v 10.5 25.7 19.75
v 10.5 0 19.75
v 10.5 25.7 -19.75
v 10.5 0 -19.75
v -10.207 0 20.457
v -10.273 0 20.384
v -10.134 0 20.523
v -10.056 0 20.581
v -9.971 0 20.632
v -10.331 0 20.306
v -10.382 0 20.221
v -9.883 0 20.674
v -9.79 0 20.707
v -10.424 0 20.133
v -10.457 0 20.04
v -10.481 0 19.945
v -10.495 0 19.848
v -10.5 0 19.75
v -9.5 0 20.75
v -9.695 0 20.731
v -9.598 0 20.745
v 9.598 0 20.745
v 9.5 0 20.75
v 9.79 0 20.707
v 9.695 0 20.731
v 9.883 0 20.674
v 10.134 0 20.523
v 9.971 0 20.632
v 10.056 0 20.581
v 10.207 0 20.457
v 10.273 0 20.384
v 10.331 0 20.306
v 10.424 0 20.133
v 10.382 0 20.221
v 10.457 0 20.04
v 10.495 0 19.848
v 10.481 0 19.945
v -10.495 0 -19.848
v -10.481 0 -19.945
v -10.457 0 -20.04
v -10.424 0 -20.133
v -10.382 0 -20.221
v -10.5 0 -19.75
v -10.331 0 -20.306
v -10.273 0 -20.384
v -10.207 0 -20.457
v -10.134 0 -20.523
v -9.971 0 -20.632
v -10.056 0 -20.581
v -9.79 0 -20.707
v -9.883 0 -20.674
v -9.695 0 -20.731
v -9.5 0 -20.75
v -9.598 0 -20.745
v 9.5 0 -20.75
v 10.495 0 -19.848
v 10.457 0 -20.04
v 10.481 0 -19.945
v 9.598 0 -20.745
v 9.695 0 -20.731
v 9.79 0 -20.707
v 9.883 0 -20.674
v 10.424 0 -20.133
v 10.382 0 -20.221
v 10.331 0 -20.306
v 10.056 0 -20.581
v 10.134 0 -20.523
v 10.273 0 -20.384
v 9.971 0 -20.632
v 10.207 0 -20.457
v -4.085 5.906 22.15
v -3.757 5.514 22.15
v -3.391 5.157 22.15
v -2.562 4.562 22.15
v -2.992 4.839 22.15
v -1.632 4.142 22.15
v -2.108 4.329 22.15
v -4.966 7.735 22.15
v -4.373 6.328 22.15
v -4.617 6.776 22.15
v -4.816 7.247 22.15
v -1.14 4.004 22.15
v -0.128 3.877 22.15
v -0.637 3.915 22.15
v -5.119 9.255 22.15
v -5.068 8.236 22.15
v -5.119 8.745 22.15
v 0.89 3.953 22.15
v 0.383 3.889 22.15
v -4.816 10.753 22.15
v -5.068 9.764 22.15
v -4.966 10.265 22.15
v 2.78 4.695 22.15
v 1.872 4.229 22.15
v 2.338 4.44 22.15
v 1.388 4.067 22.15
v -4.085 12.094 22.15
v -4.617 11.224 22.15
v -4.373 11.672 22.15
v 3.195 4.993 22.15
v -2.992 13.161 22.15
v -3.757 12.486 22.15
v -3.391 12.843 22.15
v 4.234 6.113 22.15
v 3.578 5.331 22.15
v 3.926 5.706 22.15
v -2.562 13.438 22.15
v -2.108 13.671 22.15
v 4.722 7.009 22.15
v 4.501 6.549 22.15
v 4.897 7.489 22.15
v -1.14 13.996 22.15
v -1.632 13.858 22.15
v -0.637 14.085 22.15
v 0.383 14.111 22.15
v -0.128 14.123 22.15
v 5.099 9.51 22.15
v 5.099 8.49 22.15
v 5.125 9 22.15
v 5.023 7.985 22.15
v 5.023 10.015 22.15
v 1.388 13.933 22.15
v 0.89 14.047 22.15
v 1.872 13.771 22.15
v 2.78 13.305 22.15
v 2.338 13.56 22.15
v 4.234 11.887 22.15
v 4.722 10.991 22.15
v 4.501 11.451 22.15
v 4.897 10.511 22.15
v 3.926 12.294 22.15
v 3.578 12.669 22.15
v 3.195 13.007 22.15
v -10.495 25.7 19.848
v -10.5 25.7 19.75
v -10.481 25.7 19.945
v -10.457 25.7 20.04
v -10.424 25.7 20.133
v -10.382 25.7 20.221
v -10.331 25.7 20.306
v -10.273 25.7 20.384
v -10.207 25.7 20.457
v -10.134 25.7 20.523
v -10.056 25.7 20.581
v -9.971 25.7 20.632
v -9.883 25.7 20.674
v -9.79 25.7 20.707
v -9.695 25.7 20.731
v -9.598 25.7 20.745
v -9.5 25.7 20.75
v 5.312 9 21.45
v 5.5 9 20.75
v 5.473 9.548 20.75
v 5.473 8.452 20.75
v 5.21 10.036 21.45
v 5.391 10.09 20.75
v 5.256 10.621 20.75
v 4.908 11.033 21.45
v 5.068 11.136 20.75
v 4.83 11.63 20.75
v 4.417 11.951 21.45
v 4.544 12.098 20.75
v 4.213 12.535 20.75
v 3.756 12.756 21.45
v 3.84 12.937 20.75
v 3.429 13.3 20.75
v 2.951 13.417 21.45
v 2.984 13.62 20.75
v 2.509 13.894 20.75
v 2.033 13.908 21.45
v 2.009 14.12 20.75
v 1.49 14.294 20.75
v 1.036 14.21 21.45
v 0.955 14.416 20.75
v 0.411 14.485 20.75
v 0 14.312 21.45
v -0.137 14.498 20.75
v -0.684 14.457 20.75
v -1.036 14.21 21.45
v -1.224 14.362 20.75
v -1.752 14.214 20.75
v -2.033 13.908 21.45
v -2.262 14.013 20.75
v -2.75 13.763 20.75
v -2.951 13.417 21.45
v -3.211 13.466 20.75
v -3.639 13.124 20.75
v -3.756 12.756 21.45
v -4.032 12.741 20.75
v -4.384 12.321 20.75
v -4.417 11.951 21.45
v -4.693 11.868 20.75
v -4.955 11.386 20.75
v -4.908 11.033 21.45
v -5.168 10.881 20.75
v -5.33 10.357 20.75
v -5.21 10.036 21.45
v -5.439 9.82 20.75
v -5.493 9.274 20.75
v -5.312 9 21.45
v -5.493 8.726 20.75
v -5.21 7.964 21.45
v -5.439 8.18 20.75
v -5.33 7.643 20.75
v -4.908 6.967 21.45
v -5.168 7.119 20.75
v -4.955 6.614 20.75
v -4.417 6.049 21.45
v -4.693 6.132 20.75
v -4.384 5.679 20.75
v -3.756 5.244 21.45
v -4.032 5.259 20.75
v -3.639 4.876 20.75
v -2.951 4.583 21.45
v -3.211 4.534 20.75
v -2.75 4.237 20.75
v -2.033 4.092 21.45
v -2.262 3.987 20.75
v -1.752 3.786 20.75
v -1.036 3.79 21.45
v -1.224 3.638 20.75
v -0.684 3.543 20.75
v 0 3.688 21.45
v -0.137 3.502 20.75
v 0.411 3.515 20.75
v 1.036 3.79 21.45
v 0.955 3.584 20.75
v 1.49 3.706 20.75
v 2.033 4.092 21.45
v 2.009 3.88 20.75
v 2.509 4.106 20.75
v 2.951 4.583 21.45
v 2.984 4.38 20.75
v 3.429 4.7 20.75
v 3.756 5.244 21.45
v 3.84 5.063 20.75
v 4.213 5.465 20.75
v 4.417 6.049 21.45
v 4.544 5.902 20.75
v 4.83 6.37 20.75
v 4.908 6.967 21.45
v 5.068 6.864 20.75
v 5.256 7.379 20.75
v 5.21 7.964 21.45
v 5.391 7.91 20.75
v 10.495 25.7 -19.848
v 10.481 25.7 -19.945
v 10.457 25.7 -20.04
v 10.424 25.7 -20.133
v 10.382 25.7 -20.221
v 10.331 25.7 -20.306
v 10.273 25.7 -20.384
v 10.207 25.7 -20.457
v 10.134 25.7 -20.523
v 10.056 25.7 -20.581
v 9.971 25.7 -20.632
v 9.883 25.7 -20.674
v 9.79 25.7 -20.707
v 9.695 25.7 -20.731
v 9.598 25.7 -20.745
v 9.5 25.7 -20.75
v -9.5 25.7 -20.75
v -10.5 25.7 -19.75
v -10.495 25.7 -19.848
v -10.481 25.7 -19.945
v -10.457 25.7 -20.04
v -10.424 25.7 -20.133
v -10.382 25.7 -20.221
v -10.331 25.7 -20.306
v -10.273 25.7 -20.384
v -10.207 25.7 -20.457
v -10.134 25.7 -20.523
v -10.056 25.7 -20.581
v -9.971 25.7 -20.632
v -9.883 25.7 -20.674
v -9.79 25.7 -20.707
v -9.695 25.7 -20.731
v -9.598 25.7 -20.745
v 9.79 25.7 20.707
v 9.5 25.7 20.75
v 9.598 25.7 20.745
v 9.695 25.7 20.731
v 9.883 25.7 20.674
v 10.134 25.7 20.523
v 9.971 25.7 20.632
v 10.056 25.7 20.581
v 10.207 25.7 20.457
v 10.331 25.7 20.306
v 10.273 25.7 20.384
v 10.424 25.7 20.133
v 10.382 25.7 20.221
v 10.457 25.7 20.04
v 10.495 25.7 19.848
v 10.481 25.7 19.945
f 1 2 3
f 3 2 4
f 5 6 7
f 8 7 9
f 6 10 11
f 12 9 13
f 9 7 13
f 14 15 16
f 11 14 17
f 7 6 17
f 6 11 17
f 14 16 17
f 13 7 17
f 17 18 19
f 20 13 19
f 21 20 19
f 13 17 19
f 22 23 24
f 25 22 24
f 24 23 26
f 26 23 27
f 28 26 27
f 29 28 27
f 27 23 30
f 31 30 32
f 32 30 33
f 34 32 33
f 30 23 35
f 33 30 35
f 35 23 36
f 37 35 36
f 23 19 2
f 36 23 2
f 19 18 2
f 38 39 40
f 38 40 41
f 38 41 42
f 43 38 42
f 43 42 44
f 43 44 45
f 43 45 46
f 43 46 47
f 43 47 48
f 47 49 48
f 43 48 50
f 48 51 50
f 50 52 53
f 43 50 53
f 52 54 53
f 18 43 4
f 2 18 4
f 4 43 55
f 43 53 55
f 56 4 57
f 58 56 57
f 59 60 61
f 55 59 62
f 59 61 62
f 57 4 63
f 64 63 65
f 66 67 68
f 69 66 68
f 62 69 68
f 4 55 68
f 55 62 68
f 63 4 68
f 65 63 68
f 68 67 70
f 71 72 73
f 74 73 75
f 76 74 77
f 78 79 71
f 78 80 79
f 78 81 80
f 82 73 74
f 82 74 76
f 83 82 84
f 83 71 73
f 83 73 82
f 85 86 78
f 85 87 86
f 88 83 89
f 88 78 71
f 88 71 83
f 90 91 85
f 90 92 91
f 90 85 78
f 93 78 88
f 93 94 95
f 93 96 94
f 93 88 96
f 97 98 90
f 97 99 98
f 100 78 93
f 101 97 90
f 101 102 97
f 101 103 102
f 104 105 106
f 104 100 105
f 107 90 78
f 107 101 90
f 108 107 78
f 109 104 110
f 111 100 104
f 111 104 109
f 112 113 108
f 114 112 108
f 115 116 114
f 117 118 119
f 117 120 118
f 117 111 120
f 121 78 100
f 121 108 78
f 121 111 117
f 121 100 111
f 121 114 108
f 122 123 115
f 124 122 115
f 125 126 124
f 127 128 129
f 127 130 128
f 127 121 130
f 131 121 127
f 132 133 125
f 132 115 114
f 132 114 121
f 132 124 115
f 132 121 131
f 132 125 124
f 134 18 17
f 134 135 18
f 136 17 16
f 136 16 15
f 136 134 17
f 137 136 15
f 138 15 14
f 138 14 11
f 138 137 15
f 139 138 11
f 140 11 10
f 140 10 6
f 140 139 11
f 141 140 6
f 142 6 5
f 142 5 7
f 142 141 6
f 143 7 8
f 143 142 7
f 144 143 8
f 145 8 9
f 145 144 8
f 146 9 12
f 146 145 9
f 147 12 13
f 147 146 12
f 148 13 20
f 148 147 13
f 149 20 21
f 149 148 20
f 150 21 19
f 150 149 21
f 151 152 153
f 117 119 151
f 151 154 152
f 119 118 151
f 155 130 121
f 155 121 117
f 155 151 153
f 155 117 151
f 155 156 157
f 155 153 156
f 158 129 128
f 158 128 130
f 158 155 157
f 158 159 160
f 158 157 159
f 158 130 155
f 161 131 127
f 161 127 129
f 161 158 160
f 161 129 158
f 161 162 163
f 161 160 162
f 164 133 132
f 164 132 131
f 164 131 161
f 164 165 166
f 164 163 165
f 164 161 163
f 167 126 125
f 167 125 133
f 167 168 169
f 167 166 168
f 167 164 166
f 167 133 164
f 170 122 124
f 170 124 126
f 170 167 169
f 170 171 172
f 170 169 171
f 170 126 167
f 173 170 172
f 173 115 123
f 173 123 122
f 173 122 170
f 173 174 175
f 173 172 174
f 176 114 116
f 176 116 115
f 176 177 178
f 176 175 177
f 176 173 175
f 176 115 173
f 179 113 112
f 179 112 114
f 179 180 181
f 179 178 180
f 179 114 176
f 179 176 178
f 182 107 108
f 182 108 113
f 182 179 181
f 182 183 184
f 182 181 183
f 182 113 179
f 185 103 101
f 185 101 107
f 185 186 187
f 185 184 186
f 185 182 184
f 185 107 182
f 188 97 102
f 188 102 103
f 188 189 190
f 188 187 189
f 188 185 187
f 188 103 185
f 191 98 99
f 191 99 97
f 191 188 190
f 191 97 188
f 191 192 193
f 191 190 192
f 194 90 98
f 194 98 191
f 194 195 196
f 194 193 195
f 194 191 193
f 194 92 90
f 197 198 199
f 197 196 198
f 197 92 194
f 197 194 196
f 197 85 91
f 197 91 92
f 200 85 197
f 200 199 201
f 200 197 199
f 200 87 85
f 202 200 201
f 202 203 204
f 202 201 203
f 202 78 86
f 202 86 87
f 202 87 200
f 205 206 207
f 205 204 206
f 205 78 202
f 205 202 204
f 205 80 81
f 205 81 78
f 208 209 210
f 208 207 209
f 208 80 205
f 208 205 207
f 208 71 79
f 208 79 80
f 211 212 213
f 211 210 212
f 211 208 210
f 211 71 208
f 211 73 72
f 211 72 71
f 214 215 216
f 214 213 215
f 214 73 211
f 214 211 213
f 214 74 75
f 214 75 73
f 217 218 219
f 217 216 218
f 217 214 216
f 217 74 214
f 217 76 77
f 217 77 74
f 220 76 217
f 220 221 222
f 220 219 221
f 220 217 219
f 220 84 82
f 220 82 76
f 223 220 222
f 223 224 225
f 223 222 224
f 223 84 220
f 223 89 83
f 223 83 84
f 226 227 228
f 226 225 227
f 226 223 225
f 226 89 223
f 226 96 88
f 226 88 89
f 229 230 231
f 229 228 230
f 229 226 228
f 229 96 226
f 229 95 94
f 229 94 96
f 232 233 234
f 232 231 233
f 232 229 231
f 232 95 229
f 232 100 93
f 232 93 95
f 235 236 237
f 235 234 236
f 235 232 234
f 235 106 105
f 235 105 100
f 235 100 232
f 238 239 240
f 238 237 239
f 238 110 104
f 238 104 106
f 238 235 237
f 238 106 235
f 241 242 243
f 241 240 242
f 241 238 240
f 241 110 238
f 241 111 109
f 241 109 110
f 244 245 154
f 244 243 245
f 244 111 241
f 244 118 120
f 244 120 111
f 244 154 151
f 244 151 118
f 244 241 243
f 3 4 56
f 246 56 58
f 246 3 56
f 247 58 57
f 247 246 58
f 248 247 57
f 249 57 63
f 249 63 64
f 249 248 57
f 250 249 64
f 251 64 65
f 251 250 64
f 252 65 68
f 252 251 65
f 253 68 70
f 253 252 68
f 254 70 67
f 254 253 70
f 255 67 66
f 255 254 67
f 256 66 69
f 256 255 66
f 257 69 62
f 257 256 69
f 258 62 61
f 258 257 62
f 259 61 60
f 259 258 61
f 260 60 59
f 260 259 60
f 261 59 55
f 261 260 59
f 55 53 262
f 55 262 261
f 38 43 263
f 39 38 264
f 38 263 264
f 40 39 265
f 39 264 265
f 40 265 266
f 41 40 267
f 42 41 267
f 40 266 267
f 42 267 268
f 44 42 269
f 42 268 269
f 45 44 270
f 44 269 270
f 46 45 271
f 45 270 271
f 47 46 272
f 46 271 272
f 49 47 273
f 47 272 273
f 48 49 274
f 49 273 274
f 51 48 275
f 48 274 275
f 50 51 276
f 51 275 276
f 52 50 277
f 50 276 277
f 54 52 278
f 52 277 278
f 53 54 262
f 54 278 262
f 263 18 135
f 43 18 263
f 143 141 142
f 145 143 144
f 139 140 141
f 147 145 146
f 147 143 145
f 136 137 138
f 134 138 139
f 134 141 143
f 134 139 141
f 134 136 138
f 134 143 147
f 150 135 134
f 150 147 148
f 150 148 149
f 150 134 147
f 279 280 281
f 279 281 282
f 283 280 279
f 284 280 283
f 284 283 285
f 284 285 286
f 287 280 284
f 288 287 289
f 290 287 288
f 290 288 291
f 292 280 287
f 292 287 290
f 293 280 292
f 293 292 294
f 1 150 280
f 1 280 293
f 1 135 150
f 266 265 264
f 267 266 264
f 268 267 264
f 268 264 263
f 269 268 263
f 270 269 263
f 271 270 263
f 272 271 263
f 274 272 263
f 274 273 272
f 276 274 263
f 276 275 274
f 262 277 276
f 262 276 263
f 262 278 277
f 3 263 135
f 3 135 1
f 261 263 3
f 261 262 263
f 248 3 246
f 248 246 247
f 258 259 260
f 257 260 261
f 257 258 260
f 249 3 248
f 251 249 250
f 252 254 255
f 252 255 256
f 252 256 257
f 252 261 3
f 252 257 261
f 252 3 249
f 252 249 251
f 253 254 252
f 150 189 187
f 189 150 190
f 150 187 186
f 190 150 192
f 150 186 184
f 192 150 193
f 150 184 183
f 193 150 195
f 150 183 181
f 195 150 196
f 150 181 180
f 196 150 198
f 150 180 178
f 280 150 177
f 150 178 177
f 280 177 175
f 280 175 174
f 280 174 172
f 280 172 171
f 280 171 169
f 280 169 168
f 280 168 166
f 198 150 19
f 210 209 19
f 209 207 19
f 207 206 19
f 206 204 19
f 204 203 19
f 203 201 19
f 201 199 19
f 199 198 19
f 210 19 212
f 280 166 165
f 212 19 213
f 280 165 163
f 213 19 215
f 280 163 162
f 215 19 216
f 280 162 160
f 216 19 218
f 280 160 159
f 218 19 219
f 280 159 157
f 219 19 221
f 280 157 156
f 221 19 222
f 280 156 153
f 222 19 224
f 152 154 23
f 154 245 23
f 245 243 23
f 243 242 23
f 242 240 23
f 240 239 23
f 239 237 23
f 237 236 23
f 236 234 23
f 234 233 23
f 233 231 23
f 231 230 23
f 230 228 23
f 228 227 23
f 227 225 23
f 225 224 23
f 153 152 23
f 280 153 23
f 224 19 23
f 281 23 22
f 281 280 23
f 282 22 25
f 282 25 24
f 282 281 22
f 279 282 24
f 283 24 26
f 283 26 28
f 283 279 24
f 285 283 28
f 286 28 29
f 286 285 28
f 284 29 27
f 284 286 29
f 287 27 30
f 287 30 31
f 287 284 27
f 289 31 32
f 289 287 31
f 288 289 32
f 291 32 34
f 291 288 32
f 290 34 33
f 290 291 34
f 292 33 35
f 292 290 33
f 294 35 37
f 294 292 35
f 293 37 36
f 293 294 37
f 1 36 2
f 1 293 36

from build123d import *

# Parameters (mm, degrees)
SKETCH1_W           = 21
SKETCH1_H           = 41.5
BOSS_EXTRUDE1_DEPTH = 25.7
FILLET1_R           = 1
SKETCH2_R           = 5.5
BOSS_EXTRUDE2_DEPTH = 1.4
BOSS_EXTRUDE2_TAPER = 15


with BuildPart() as part:
    # Sketch1 → Boss-Extrude1 (new body)
    with BuildSketch(Plane(origin=(0, 0, 0), x_dir=(1, 0, 0), z_dir=(0, 1, 0))):
        Rectangle(SKETCH1_W, SKETCH1_H)
    extrude(amount=BOSS_EXTRUDE1_DEPTH)

    # Fillet1
    fillet1_edges = [part.edges().sort_by_distance(p)[0] for p in [
        (-10.5, 12.85, -20.75),
        (10.5, 12.85, -20.75),
        (10.5, 12.85, 20.75),
        (-10.5, 12.85, 20.75),
    ]]
    fillet(fillet1_edges, radius=FILLET1_R)

    # Sketch2 → Boss-Extrude2 (add)
    with BuildSketch(Plane.XY.offset(20.75)):
        with Locations((0, 9)):
            Circle(SKETCH2_R)
    extrude(amount=BOSS_EXTRUDE2_DEPTH, taper=BOSS_EXTRUDE2_TAPER)


solid = part.part
